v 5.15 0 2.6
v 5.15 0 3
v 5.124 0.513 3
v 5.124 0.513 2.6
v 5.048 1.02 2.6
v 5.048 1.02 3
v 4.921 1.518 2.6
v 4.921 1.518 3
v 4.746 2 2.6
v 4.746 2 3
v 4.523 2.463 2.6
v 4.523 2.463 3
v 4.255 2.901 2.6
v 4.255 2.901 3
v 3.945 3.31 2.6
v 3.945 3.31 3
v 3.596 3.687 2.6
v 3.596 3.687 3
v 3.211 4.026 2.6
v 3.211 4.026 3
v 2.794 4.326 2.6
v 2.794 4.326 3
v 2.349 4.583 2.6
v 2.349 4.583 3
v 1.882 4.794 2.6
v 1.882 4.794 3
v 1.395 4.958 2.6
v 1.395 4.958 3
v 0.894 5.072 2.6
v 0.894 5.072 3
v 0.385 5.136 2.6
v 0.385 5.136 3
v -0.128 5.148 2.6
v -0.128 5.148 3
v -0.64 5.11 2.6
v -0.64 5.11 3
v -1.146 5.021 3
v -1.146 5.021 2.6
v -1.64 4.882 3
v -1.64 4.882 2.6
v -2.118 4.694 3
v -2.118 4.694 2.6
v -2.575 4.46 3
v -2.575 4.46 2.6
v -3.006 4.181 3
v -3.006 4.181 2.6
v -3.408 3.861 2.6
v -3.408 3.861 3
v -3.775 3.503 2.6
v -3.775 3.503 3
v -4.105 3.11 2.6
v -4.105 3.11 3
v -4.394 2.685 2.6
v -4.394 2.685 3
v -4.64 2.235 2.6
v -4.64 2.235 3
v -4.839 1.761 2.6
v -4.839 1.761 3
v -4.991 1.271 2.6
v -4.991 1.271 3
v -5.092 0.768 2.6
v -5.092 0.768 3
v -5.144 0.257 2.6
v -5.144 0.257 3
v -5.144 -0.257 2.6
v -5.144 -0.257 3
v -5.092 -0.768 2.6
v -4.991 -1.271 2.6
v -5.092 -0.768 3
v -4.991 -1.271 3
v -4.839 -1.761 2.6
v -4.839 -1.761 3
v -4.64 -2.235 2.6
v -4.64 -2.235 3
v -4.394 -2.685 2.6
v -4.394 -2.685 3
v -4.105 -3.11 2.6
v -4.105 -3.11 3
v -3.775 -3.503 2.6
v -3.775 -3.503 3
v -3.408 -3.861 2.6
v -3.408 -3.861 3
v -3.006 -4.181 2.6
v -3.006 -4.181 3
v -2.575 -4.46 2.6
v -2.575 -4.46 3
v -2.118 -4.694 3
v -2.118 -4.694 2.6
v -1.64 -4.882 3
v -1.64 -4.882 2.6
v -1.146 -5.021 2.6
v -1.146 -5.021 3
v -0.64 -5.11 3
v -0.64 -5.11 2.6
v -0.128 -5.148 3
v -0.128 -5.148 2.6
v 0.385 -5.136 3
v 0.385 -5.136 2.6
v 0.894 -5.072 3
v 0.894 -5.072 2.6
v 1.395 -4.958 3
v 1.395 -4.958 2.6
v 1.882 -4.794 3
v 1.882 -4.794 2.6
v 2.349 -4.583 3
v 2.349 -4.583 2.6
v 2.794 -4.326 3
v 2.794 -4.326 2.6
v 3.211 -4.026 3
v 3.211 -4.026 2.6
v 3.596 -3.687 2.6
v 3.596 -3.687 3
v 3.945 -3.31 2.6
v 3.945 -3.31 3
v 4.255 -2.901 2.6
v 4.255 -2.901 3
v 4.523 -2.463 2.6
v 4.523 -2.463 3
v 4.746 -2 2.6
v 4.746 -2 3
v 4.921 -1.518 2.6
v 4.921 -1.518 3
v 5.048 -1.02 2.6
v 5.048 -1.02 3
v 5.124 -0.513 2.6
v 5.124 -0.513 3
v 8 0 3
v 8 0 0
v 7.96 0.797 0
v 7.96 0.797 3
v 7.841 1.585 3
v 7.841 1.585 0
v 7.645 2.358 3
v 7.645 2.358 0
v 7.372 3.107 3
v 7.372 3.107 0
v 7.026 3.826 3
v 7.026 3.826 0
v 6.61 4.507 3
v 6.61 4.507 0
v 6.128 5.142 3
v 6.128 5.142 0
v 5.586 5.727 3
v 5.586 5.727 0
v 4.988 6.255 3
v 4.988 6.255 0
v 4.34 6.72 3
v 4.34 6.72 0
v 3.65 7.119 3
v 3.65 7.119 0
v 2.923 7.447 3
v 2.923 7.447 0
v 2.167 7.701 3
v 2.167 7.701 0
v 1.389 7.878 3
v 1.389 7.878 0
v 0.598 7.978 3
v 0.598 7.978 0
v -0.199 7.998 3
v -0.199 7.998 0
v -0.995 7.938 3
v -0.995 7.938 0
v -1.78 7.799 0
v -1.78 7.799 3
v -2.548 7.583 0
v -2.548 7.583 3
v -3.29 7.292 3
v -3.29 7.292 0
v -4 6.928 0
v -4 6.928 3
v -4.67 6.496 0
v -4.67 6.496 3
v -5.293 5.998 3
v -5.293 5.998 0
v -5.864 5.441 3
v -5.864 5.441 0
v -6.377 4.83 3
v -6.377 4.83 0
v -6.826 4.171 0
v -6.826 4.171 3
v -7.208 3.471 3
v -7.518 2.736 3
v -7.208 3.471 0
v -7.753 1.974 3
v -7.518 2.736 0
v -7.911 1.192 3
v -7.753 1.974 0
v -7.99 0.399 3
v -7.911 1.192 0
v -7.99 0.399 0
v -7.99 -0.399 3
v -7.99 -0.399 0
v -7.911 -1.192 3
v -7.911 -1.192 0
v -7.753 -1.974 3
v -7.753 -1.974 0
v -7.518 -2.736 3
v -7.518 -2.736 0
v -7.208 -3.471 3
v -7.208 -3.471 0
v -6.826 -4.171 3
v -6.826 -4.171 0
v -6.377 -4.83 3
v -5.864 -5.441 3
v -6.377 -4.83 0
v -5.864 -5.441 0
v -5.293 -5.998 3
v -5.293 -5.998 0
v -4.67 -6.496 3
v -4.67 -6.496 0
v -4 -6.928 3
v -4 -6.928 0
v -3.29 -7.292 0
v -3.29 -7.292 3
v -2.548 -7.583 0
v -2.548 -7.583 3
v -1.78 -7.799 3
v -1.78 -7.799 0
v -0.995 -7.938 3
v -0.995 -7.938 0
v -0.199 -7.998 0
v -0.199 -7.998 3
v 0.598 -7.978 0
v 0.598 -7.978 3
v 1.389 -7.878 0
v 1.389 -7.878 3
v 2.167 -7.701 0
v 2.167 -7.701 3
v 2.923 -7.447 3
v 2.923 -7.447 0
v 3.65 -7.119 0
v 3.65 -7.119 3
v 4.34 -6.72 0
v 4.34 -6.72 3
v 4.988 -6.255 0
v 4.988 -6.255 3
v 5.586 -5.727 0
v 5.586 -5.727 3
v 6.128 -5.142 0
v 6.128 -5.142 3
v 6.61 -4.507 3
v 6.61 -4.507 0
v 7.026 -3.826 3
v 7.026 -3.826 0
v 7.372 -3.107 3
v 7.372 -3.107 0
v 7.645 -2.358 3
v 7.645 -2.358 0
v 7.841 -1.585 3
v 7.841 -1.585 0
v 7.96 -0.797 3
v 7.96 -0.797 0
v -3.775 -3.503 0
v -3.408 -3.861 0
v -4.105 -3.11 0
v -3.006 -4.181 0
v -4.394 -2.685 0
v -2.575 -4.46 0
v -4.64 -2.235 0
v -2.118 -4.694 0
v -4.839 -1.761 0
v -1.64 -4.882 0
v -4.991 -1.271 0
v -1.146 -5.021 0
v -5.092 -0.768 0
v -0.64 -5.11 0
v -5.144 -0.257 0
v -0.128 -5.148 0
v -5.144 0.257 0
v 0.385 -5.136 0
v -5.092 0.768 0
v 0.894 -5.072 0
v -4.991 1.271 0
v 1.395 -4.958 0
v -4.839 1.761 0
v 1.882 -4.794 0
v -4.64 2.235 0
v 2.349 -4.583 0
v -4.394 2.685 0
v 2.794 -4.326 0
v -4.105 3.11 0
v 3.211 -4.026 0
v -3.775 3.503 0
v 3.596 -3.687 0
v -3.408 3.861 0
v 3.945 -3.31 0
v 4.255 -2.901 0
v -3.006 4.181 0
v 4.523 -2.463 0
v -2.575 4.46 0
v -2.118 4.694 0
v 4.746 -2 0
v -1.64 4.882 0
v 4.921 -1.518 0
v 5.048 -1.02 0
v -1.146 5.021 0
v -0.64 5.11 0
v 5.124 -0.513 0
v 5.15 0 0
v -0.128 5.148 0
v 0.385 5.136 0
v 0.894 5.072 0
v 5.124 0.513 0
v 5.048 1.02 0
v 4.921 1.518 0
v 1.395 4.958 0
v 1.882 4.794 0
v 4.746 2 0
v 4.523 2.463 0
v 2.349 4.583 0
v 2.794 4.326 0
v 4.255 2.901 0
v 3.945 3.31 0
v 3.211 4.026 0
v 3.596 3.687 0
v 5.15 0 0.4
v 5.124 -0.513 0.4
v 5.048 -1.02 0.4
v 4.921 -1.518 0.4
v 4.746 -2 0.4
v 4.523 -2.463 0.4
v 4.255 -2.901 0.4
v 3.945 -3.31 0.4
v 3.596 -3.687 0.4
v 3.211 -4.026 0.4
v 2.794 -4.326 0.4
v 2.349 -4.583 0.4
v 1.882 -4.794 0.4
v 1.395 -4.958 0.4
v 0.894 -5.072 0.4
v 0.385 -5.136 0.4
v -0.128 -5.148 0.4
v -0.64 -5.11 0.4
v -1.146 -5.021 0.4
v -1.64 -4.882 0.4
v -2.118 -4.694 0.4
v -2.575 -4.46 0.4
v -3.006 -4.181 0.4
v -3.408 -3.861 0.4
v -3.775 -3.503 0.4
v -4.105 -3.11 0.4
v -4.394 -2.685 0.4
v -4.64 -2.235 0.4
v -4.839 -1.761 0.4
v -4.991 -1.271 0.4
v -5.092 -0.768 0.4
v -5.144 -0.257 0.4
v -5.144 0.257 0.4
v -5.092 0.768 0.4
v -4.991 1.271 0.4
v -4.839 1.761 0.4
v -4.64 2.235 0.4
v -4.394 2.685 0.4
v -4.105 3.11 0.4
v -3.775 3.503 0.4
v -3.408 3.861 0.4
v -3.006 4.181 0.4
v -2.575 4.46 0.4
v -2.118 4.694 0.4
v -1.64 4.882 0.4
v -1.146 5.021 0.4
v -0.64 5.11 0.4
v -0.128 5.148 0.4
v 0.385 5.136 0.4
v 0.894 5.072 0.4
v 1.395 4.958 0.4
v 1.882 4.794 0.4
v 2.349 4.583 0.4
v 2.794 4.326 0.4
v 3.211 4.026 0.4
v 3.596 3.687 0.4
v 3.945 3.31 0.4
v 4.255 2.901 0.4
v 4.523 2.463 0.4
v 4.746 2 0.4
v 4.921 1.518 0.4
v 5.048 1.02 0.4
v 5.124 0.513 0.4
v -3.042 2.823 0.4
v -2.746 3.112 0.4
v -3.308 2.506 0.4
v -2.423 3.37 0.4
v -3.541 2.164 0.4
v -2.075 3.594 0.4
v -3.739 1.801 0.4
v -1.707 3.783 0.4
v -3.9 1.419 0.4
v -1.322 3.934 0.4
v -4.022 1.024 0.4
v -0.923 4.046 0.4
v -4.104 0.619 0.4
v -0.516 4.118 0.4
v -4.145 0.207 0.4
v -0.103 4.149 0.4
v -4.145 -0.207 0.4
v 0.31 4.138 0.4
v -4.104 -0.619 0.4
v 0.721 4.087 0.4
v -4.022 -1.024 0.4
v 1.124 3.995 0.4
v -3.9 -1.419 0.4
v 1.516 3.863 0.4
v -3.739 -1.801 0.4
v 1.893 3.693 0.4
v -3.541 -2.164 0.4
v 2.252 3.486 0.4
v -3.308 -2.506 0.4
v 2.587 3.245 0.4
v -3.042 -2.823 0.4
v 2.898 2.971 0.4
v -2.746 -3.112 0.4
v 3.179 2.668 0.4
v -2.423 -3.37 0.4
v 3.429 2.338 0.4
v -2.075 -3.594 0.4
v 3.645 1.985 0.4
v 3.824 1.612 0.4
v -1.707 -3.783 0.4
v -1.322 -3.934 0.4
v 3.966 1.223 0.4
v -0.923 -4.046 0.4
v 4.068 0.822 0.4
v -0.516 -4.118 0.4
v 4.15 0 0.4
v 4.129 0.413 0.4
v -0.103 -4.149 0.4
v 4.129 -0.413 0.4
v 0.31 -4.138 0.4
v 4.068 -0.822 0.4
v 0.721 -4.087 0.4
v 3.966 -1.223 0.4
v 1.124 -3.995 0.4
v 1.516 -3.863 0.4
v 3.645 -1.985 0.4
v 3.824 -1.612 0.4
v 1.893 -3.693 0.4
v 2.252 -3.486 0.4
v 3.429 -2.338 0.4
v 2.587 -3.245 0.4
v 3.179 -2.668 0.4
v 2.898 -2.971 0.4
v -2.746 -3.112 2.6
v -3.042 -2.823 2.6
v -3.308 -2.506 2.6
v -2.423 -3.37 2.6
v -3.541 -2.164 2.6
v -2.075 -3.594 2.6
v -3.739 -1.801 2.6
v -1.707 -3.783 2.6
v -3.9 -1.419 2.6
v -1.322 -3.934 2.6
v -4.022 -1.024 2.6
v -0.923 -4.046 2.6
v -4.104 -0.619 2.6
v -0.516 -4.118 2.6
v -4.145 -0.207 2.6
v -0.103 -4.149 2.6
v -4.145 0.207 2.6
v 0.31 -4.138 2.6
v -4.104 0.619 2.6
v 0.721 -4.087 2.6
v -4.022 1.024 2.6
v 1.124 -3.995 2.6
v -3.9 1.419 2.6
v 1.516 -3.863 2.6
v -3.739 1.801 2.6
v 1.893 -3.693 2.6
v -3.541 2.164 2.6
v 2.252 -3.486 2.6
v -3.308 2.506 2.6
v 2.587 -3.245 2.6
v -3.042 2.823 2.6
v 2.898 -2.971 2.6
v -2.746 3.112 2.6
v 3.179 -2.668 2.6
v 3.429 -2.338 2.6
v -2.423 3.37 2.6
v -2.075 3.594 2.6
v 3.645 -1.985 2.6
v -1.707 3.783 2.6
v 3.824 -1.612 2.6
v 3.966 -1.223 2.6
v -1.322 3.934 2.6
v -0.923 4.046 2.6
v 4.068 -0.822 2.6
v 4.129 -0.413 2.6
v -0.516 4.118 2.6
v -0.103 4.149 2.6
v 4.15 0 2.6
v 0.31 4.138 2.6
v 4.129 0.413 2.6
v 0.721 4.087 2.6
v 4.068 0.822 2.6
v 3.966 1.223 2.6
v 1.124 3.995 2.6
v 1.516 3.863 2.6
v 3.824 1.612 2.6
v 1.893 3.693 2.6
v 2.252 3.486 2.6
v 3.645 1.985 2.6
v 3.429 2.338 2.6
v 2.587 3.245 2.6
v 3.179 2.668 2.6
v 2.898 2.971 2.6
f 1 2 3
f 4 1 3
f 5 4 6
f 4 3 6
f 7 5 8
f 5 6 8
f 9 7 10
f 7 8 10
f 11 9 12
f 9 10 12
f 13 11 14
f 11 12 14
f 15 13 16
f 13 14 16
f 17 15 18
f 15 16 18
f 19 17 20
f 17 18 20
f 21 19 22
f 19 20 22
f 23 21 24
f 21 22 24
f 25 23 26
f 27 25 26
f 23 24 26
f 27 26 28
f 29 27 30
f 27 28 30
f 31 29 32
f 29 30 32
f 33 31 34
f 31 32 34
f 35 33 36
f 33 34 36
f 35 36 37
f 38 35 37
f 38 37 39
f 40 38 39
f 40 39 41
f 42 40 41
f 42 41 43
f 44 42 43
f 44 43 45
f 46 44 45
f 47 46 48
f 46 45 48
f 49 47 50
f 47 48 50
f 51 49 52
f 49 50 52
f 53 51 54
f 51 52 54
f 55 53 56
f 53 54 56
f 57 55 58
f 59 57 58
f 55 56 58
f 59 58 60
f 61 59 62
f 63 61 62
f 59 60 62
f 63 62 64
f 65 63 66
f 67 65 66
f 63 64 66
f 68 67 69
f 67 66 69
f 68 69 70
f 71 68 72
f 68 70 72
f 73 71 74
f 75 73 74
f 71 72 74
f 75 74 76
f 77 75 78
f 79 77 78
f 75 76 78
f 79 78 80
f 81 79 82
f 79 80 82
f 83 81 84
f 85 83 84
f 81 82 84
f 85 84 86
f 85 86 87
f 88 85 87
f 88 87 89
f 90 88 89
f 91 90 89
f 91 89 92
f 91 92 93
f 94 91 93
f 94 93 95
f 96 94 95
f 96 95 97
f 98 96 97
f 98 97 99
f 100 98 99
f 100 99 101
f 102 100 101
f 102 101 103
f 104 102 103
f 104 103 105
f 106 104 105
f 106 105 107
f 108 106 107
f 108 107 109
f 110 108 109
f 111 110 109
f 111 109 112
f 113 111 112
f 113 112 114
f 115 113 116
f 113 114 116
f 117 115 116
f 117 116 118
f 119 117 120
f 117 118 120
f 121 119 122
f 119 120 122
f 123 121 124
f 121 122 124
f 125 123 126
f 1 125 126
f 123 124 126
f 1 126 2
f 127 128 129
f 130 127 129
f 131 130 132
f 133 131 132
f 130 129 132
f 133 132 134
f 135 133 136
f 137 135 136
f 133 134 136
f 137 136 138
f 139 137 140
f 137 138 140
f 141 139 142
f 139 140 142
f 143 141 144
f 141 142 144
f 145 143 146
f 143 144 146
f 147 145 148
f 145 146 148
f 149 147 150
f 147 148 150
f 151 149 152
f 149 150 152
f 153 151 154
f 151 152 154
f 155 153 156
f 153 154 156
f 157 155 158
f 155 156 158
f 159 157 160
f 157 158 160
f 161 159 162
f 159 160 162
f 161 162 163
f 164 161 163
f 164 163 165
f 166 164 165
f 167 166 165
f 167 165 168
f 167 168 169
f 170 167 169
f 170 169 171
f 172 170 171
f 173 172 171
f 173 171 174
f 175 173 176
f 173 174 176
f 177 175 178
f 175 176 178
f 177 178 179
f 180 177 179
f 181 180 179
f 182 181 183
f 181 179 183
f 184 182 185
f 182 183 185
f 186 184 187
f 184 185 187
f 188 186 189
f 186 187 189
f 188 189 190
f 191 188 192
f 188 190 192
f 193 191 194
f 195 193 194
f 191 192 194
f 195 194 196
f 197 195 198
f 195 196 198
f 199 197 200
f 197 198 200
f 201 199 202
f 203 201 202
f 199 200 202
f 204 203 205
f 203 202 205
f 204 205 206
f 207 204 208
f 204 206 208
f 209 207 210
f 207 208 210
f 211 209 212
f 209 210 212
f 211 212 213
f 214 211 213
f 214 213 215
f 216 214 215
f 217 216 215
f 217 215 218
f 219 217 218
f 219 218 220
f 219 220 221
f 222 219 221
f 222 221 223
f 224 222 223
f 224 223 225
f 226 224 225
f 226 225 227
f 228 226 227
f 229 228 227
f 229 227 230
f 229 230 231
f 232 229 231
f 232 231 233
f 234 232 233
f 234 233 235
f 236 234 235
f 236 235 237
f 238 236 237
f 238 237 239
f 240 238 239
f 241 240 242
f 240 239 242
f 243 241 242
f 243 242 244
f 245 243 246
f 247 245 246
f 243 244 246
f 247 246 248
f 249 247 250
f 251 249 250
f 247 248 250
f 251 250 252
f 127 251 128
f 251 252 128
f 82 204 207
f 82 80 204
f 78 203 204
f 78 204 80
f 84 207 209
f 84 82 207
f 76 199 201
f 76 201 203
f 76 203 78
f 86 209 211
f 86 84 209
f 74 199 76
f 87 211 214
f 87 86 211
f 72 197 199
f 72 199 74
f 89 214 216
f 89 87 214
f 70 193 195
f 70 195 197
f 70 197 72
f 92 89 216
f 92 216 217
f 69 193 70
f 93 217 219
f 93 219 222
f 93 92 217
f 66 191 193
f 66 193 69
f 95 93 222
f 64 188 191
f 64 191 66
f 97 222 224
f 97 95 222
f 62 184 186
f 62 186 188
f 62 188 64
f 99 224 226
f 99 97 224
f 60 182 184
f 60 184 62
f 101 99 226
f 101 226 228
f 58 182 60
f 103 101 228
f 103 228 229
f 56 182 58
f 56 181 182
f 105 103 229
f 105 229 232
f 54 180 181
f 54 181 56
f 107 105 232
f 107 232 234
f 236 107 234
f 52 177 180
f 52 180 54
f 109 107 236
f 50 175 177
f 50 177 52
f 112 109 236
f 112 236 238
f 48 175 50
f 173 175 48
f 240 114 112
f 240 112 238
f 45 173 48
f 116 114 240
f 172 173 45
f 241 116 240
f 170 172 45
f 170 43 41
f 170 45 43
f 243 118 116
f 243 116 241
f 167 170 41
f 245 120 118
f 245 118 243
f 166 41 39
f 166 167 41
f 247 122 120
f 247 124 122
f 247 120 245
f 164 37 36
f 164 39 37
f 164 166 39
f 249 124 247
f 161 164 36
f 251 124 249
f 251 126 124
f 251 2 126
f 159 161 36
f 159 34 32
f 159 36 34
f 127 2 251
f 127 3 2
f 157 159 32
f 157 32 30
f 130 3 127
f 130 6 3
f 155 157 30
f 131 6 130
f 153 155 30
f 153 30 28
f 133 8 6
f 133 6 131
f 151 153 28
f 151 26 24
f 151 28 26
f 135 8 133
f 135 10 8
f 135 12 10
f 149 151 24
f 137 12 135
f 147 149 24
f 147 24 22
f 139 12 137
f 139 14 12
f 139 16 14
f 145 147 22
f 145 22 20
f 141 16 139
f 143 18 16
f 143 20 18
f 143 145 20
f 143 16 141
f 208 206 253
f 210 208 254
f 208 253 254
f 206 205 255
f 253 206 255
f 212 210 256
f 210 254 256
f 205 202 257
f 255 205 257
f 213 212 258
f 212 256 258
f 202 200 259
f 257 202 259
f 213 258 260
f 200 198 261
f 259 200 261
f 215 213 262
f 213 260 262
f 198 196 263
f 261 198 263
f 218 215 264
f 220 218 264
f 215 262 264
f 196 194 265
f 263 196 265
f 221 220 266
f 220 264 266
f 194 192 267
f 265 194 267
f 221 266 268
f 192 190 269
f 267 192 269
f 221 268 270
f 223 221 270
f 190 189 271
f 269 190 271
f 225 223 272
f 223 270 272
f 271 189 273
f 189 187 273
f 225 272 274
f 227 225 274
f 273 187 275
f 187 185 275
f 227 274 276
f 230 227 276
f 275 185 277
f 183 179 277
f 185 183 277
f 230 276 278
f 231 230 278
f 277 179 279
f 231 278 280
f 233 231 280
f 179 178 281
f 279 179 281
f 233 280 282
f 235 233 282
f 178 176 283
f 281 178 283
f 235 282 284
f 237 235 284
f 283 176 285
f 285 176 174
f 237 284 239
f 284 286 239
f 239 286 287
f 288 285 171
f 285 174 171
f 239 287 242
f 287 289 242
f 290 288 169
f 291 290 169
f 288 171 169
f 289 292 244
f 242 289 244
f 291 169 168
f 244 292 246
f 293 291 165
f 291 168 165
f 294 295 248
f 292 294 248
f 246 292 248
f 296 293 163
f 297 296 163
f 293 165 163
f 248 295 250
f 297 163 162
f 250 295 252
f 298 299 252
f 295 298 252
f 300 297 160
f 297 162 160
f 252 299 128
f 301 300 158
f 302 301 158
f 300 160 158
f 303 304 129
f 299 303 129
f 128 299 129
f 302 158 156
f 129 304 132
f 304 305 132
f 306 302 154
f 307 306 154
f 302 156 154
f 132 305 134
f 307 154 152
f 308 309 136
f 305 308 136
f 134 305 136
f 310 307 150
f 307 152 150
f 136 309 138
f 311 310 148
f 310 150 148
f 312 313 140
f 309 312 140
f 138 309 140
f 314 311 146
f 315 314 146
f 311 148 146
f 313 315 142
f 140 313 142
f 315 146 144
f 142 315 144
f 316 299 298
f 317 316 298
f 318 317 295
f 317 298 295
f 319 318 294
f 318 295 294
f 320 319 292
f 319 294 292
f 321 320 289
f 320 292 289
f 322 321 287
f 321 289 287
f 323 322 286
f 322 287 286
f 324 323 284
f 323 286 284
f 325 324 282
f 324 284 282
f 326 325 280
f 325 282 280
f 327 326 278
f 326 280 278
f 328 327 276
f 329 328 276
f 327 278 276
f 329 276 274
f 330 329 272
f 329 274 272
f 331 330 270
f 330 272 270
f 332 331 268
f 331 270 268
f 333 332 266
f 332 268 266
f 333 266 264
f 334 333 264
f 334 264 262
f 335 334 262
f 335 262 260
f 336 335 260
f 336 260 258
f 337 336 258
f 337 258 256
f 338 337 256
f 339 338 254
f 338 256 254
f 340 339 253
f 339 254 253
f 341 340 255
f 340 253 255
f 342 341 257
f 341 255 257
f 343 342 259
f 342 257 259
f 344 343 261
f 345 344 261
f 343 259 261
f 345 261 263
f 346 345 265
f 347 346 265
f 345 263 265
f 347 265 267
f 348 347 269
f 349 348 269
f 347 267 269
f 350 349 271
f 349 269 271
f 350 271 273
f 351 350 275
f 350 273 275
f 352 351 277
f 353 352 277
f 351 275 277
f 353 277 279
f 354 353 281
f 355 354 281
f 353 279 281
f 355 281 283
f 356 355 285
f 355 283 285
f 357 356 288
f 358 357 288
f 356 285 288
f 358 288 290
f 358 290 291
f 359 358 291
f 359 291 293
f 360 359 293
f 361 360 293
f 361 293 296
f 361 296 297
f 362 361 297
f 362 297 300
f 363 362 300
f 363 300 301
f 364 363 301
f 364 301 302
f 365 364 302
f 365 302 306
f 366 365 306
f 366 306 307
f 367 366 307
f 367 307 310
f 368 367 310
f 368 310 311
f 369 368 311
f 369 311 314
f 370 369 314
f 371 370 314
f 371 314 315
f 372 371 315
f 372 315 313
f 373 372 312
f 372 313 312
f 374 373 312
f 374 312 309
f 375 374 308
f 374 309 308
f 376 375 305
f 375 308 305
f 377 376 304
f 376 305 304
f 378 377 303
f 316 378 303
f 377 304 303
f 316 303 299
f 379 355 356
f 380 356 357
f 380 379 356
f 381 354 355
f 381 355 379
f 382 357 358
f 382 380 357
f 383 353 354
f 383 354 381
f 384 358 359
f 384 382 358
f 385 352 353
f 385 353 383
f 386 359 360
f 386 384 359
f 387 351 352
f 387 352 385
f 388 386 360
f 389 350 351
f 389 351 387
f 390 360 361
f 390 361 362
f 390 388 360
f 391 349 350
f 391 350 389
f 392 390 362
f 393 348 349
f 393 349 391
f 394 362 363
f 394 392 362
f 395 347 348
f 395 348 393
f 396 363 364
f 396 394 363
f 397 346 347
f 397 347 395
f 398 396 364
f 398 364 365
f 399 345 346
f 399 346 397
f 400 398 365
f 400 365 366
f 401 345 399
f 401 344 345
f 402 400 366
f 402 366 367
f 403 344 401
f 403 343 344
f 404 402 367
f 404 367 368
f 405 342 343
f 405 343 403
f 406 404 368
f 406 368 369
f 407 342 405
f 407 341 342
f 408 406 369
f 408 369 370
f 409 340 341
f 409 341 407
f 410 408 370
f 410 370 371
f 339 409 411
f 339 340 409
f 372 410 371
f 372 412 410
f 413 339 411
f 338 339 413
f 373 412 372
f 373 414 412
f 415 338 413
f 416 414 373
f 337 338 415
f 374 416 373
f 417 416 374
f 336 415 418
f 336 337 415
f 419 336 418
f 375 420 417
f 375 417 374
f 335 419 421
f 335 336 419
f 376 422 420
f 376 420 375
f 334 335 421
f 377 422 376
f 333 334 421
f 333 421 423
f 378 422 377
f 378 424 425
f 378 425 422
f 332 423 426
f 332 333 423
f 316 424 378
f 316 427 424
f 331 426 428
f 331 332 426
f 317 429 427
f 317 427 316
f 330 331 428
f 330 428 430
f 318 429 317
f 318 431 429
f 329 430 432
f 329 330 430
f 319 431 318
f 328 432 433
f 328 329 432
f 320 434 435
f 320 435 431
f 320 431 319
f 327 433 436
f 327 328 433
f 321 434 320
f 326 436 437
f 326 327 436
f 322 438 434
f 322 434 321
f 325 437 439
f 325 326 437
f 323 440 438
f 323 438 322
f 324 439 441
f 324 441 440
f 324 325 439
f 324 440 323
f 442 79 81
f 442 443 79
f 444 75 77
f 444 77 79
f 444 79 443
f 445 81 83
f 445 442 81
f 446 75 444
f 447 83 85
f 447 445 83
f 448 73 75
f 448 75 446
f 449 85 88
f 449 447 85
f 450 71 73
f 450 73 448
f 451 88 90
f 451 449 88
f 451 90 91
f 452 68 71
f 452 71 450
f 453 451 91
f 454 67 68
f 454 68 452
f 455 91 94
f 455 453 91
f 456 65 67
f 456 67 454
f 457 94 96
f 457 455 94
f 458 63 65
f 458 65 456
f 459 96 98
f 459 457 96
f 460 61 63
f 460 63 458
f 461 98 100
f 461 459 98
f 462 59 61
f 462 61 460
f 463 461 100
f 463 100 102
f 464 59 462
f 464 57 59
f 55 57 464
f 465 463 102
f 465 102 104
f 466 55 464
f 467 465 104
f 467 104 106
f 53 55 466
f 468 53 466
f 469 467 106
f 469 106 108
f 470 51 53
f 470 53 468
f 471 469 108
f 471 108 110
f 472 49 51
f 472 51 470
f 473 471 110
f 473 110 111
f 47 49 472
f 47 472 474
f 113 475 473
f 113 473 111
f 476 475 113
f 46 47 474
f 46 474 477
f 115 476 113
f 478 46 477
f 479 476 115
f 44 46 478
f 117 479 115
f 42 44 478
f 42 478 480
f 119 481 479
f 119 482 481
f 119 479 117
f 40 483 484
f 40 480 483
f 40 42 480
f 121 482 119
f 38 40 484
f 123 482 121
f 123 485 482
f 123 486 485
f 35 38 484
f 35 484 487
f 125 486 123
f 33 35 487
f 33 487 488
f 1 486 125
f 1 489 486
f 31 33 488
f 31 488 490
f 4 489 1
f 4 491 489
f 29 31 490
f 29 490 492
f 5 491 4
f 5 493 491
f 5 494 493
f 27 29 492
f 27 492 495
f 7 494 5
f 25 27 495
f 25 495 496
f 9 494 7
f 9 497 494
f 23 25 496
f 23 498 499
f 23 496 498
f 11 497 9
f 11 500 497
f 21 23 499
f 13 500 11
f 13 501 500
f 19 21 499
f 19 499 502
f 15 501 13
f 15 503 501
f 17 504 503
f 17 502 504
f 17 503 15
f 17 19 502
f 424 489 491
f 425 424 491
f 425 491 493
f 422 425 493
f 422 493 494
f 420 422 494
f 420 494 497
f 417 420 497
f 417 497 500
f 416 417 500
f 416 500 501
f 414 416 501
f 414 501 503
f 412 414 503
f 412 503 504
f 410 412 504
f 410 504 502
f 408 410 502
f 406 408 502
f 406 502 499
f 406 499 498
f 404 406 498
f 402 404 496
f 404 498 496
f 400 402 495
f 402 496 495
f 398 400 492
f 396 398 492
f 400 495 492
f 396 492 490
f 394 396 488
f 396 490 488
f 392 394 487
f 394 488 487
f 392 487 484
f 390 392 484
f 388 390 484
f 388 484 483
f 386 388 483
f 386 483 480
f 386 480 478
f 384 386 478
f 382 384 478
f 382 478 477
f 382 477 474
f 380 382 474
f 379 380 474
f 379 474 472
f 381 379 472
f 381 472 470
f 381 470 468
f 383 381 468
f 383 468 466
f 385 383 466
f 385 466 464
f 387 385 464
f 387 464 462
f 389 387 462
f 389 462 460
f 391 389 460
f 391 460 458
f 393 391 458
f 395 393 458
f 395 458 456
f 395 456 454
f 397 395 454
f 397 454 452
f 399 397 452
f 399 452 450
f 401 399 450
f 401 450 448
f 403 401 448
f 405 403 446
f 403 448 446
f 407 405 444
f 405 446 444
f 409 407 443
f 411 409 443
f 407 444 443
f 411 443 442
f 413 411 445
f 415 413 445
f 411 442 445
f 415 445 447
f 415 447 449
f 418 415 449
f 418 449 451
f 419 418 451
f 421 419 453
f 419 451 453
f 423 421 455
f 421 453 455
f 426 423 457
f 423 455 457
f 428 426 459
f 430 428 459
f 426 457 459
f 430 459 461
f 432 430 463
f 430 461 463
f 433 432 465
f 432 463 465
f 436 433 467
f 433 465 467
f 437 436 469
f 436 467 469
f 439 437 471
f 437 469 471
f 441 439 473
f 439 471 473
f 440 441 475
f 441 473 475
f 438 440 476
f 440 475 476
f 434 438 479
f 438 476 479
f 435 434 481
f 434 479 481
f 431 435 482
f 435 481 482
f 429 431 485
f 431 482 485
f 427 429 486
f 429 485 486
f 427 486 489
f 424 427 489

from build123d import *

# Parameters (mm, degrees)
F0_R     = 8
F1_DEPTH = 3
F2_R     = 4.15
F3_DEPTH = 25
F4_R     = 5.15
F5_DEPTH = 0.4
F6_R     = 5.15
F7_DEPTH = 0.4


with BuildPart() as f1:
    # F0 (on Top) → F1 (new body)
    with BuildSketch(Plane.XY):
        Circle(F0_R)
    extrude(amount=F1_DEPTH)

    # F2 (on face) → F3 (cut)
    with BuildSketch(Plane.XY.offset(3)):
        Circle(F2_R)
    extrude(amount=-F3_DEPTH, mode=Mode.SUBTRACT)

    # F4 (on face) → F5 (cut)
    with BuildSketch(Plane(origin=(0, 0, 0), x_dir=(1, 0, 0), z_dir=(0, 0, -1))):
        Circle(F4_R)
    extrude(amount=-F5_DEPTH, mode=Mode.SUBTRACT)

    # F6 (on face) → F7 (cut)
    with BuildSketch(Plane.XY.offset(3)):
        Circle(F6_R)
    extrude(amount=-F7_DEPTH, mode=Mode.SUBTRACT)


solid = f1.part
